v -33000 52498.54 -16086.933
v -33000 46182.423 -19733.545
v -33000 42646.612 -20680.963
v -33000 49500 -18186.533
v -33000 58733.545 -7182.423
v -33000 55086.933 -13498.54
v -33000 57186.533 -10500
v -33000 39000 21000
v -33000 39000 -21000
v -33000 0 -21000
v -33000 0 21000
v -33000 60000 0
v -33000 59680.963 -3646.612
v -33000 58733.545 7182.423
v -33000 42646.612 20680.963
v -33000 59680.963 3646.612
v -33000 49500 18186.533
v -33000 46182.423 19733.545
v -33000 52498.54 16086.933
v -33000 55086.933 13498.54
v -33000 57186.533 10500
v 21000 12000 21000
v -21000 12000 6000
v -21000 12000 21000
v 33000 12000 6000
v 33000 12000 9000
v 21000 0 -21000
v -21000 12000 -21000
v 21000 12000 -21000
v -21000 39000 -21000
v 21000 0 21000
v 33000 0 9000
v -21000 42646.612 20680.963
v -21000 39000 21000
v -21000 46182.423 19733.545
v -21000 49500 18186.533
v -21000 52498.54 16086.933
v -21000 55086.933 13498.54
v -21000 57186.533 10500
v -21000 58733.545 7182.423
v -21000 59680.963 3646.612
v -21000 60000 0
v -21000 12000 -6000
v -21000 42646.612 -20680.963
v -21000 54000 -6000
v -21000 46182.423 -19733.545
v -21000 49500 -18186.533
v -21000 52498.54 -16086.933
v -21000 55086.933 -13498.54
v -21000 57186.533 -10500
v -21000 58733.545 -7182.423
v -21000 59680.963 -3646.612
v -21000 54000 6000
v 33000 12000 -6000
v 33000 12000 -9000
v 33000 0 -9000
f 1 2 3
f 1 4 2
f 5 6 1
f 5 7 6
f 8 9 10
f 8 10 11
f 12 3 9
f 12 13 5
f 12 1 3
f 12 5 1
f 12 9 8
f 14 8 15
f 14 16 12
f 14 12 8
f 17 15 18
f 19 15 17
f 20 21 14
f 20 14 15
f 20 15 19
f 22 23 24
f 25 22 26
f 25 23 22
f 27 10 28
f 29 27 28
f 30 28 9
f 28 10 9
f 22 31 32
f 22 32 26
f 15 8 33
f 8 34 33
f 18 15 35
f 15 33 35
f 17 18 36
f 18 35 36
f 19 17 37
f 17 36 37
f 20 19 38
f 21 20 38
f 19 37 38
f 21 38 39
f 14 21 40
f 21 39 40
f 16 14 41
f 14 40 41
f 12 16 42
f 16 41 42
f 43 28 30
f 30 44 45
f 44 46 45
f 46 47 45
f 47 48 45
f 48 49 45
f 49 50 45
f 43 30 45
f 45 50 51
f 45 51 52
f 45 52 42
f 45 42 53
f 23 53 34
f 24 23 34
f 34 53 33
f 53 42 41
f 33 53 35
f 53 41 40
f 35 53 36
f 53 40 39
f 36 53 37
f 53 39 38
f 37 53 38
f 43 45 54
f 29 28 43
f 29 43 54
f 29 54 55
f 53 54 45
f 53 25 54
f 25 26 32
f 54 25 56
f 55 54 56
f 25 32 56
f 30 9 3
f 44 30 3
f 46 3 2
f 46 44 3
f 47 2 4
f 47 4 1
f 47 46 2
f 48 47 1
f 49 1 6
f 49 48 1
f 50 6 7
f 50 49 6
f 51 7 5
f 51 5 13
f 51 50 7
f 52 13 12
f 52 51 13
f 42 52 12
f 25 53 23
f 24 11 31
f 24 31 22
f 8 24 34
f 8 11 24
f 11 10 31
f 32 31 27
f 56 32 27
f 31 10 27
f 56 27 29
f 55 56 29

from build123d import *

# Parameters (mm, degrees)
SKETCH10_W          = 66000
SKETCH10_H          = 42000
BOSS_EXTRUDE3_DEPTH = 12000
CHAMFER1_SIZE       = 12000
SKETCH14_W          = 42000
SKETCH14_H          = 48000
BOSS_EXTRUDE6_DEPTH = 12000
FILLET1_R           = 21000
BOSS_EXTRUDE7_DEPTH = 6000


with BuildPart() as part:
    # Sketch10 → Boss-Extrude3 (new body)
    with BuildSketch(Plane(origin=(0, 0, 0), x_dir=(1, 0, 0), z_dir=(0, 1, 0))):
        Rectangle(SKETCH10_W, SKETCH10_H)
    extrude(amount=BOSS_EXTRUDE3_DEPTH)

    # Chamfer1
    chamfer1_edges = [part.edges().sort_by_distance(p)[0] for p in [
        (33000, 6000, 21000),
        (33000, 6000, -21000),
    ]]
    chamfer(chamfer1_edges, length=CHAMFER1_SIZE)



with BuildPart() as body_2:
    # Sketch14 → Boss-Extrude6 (new body)
    with BuildSketch(Plane.ZY.offset(33000)):
        with Locations((0, 36000)):
            Rectangle(SKETCH14_W, SKETCH14_H)
    extrude(amount=-BOSS_EXTRUDE6_DEPTH)

    # Fillet1
    fillet1_edges = [body_2.edges().sort_by_distance(p)[0] for p in [
        (-27000, 60000, 21000),
        (-27000, 60000, -21000),
    ]]
    fillet(fillet1_edges, radius=FILLET1_R - 0.0001)  # a hair under: the kernel refuses the full size


with BuildPart() as part_1:
    add(part.part)

    add(body_2.part)  # Boss-Extrude7 merges body 2
    # Sketch15 → Boss-Extrude7 (add, symmetric)
    with BuildSketch(Plane.XY):
        Polygon((-21000, 54000), (-21000, 12000), (33000, 12000), align=None)
    extrude(amount=BOSS_EXTRUDE7_DEPTH, both=True)


solid = part_1.part
